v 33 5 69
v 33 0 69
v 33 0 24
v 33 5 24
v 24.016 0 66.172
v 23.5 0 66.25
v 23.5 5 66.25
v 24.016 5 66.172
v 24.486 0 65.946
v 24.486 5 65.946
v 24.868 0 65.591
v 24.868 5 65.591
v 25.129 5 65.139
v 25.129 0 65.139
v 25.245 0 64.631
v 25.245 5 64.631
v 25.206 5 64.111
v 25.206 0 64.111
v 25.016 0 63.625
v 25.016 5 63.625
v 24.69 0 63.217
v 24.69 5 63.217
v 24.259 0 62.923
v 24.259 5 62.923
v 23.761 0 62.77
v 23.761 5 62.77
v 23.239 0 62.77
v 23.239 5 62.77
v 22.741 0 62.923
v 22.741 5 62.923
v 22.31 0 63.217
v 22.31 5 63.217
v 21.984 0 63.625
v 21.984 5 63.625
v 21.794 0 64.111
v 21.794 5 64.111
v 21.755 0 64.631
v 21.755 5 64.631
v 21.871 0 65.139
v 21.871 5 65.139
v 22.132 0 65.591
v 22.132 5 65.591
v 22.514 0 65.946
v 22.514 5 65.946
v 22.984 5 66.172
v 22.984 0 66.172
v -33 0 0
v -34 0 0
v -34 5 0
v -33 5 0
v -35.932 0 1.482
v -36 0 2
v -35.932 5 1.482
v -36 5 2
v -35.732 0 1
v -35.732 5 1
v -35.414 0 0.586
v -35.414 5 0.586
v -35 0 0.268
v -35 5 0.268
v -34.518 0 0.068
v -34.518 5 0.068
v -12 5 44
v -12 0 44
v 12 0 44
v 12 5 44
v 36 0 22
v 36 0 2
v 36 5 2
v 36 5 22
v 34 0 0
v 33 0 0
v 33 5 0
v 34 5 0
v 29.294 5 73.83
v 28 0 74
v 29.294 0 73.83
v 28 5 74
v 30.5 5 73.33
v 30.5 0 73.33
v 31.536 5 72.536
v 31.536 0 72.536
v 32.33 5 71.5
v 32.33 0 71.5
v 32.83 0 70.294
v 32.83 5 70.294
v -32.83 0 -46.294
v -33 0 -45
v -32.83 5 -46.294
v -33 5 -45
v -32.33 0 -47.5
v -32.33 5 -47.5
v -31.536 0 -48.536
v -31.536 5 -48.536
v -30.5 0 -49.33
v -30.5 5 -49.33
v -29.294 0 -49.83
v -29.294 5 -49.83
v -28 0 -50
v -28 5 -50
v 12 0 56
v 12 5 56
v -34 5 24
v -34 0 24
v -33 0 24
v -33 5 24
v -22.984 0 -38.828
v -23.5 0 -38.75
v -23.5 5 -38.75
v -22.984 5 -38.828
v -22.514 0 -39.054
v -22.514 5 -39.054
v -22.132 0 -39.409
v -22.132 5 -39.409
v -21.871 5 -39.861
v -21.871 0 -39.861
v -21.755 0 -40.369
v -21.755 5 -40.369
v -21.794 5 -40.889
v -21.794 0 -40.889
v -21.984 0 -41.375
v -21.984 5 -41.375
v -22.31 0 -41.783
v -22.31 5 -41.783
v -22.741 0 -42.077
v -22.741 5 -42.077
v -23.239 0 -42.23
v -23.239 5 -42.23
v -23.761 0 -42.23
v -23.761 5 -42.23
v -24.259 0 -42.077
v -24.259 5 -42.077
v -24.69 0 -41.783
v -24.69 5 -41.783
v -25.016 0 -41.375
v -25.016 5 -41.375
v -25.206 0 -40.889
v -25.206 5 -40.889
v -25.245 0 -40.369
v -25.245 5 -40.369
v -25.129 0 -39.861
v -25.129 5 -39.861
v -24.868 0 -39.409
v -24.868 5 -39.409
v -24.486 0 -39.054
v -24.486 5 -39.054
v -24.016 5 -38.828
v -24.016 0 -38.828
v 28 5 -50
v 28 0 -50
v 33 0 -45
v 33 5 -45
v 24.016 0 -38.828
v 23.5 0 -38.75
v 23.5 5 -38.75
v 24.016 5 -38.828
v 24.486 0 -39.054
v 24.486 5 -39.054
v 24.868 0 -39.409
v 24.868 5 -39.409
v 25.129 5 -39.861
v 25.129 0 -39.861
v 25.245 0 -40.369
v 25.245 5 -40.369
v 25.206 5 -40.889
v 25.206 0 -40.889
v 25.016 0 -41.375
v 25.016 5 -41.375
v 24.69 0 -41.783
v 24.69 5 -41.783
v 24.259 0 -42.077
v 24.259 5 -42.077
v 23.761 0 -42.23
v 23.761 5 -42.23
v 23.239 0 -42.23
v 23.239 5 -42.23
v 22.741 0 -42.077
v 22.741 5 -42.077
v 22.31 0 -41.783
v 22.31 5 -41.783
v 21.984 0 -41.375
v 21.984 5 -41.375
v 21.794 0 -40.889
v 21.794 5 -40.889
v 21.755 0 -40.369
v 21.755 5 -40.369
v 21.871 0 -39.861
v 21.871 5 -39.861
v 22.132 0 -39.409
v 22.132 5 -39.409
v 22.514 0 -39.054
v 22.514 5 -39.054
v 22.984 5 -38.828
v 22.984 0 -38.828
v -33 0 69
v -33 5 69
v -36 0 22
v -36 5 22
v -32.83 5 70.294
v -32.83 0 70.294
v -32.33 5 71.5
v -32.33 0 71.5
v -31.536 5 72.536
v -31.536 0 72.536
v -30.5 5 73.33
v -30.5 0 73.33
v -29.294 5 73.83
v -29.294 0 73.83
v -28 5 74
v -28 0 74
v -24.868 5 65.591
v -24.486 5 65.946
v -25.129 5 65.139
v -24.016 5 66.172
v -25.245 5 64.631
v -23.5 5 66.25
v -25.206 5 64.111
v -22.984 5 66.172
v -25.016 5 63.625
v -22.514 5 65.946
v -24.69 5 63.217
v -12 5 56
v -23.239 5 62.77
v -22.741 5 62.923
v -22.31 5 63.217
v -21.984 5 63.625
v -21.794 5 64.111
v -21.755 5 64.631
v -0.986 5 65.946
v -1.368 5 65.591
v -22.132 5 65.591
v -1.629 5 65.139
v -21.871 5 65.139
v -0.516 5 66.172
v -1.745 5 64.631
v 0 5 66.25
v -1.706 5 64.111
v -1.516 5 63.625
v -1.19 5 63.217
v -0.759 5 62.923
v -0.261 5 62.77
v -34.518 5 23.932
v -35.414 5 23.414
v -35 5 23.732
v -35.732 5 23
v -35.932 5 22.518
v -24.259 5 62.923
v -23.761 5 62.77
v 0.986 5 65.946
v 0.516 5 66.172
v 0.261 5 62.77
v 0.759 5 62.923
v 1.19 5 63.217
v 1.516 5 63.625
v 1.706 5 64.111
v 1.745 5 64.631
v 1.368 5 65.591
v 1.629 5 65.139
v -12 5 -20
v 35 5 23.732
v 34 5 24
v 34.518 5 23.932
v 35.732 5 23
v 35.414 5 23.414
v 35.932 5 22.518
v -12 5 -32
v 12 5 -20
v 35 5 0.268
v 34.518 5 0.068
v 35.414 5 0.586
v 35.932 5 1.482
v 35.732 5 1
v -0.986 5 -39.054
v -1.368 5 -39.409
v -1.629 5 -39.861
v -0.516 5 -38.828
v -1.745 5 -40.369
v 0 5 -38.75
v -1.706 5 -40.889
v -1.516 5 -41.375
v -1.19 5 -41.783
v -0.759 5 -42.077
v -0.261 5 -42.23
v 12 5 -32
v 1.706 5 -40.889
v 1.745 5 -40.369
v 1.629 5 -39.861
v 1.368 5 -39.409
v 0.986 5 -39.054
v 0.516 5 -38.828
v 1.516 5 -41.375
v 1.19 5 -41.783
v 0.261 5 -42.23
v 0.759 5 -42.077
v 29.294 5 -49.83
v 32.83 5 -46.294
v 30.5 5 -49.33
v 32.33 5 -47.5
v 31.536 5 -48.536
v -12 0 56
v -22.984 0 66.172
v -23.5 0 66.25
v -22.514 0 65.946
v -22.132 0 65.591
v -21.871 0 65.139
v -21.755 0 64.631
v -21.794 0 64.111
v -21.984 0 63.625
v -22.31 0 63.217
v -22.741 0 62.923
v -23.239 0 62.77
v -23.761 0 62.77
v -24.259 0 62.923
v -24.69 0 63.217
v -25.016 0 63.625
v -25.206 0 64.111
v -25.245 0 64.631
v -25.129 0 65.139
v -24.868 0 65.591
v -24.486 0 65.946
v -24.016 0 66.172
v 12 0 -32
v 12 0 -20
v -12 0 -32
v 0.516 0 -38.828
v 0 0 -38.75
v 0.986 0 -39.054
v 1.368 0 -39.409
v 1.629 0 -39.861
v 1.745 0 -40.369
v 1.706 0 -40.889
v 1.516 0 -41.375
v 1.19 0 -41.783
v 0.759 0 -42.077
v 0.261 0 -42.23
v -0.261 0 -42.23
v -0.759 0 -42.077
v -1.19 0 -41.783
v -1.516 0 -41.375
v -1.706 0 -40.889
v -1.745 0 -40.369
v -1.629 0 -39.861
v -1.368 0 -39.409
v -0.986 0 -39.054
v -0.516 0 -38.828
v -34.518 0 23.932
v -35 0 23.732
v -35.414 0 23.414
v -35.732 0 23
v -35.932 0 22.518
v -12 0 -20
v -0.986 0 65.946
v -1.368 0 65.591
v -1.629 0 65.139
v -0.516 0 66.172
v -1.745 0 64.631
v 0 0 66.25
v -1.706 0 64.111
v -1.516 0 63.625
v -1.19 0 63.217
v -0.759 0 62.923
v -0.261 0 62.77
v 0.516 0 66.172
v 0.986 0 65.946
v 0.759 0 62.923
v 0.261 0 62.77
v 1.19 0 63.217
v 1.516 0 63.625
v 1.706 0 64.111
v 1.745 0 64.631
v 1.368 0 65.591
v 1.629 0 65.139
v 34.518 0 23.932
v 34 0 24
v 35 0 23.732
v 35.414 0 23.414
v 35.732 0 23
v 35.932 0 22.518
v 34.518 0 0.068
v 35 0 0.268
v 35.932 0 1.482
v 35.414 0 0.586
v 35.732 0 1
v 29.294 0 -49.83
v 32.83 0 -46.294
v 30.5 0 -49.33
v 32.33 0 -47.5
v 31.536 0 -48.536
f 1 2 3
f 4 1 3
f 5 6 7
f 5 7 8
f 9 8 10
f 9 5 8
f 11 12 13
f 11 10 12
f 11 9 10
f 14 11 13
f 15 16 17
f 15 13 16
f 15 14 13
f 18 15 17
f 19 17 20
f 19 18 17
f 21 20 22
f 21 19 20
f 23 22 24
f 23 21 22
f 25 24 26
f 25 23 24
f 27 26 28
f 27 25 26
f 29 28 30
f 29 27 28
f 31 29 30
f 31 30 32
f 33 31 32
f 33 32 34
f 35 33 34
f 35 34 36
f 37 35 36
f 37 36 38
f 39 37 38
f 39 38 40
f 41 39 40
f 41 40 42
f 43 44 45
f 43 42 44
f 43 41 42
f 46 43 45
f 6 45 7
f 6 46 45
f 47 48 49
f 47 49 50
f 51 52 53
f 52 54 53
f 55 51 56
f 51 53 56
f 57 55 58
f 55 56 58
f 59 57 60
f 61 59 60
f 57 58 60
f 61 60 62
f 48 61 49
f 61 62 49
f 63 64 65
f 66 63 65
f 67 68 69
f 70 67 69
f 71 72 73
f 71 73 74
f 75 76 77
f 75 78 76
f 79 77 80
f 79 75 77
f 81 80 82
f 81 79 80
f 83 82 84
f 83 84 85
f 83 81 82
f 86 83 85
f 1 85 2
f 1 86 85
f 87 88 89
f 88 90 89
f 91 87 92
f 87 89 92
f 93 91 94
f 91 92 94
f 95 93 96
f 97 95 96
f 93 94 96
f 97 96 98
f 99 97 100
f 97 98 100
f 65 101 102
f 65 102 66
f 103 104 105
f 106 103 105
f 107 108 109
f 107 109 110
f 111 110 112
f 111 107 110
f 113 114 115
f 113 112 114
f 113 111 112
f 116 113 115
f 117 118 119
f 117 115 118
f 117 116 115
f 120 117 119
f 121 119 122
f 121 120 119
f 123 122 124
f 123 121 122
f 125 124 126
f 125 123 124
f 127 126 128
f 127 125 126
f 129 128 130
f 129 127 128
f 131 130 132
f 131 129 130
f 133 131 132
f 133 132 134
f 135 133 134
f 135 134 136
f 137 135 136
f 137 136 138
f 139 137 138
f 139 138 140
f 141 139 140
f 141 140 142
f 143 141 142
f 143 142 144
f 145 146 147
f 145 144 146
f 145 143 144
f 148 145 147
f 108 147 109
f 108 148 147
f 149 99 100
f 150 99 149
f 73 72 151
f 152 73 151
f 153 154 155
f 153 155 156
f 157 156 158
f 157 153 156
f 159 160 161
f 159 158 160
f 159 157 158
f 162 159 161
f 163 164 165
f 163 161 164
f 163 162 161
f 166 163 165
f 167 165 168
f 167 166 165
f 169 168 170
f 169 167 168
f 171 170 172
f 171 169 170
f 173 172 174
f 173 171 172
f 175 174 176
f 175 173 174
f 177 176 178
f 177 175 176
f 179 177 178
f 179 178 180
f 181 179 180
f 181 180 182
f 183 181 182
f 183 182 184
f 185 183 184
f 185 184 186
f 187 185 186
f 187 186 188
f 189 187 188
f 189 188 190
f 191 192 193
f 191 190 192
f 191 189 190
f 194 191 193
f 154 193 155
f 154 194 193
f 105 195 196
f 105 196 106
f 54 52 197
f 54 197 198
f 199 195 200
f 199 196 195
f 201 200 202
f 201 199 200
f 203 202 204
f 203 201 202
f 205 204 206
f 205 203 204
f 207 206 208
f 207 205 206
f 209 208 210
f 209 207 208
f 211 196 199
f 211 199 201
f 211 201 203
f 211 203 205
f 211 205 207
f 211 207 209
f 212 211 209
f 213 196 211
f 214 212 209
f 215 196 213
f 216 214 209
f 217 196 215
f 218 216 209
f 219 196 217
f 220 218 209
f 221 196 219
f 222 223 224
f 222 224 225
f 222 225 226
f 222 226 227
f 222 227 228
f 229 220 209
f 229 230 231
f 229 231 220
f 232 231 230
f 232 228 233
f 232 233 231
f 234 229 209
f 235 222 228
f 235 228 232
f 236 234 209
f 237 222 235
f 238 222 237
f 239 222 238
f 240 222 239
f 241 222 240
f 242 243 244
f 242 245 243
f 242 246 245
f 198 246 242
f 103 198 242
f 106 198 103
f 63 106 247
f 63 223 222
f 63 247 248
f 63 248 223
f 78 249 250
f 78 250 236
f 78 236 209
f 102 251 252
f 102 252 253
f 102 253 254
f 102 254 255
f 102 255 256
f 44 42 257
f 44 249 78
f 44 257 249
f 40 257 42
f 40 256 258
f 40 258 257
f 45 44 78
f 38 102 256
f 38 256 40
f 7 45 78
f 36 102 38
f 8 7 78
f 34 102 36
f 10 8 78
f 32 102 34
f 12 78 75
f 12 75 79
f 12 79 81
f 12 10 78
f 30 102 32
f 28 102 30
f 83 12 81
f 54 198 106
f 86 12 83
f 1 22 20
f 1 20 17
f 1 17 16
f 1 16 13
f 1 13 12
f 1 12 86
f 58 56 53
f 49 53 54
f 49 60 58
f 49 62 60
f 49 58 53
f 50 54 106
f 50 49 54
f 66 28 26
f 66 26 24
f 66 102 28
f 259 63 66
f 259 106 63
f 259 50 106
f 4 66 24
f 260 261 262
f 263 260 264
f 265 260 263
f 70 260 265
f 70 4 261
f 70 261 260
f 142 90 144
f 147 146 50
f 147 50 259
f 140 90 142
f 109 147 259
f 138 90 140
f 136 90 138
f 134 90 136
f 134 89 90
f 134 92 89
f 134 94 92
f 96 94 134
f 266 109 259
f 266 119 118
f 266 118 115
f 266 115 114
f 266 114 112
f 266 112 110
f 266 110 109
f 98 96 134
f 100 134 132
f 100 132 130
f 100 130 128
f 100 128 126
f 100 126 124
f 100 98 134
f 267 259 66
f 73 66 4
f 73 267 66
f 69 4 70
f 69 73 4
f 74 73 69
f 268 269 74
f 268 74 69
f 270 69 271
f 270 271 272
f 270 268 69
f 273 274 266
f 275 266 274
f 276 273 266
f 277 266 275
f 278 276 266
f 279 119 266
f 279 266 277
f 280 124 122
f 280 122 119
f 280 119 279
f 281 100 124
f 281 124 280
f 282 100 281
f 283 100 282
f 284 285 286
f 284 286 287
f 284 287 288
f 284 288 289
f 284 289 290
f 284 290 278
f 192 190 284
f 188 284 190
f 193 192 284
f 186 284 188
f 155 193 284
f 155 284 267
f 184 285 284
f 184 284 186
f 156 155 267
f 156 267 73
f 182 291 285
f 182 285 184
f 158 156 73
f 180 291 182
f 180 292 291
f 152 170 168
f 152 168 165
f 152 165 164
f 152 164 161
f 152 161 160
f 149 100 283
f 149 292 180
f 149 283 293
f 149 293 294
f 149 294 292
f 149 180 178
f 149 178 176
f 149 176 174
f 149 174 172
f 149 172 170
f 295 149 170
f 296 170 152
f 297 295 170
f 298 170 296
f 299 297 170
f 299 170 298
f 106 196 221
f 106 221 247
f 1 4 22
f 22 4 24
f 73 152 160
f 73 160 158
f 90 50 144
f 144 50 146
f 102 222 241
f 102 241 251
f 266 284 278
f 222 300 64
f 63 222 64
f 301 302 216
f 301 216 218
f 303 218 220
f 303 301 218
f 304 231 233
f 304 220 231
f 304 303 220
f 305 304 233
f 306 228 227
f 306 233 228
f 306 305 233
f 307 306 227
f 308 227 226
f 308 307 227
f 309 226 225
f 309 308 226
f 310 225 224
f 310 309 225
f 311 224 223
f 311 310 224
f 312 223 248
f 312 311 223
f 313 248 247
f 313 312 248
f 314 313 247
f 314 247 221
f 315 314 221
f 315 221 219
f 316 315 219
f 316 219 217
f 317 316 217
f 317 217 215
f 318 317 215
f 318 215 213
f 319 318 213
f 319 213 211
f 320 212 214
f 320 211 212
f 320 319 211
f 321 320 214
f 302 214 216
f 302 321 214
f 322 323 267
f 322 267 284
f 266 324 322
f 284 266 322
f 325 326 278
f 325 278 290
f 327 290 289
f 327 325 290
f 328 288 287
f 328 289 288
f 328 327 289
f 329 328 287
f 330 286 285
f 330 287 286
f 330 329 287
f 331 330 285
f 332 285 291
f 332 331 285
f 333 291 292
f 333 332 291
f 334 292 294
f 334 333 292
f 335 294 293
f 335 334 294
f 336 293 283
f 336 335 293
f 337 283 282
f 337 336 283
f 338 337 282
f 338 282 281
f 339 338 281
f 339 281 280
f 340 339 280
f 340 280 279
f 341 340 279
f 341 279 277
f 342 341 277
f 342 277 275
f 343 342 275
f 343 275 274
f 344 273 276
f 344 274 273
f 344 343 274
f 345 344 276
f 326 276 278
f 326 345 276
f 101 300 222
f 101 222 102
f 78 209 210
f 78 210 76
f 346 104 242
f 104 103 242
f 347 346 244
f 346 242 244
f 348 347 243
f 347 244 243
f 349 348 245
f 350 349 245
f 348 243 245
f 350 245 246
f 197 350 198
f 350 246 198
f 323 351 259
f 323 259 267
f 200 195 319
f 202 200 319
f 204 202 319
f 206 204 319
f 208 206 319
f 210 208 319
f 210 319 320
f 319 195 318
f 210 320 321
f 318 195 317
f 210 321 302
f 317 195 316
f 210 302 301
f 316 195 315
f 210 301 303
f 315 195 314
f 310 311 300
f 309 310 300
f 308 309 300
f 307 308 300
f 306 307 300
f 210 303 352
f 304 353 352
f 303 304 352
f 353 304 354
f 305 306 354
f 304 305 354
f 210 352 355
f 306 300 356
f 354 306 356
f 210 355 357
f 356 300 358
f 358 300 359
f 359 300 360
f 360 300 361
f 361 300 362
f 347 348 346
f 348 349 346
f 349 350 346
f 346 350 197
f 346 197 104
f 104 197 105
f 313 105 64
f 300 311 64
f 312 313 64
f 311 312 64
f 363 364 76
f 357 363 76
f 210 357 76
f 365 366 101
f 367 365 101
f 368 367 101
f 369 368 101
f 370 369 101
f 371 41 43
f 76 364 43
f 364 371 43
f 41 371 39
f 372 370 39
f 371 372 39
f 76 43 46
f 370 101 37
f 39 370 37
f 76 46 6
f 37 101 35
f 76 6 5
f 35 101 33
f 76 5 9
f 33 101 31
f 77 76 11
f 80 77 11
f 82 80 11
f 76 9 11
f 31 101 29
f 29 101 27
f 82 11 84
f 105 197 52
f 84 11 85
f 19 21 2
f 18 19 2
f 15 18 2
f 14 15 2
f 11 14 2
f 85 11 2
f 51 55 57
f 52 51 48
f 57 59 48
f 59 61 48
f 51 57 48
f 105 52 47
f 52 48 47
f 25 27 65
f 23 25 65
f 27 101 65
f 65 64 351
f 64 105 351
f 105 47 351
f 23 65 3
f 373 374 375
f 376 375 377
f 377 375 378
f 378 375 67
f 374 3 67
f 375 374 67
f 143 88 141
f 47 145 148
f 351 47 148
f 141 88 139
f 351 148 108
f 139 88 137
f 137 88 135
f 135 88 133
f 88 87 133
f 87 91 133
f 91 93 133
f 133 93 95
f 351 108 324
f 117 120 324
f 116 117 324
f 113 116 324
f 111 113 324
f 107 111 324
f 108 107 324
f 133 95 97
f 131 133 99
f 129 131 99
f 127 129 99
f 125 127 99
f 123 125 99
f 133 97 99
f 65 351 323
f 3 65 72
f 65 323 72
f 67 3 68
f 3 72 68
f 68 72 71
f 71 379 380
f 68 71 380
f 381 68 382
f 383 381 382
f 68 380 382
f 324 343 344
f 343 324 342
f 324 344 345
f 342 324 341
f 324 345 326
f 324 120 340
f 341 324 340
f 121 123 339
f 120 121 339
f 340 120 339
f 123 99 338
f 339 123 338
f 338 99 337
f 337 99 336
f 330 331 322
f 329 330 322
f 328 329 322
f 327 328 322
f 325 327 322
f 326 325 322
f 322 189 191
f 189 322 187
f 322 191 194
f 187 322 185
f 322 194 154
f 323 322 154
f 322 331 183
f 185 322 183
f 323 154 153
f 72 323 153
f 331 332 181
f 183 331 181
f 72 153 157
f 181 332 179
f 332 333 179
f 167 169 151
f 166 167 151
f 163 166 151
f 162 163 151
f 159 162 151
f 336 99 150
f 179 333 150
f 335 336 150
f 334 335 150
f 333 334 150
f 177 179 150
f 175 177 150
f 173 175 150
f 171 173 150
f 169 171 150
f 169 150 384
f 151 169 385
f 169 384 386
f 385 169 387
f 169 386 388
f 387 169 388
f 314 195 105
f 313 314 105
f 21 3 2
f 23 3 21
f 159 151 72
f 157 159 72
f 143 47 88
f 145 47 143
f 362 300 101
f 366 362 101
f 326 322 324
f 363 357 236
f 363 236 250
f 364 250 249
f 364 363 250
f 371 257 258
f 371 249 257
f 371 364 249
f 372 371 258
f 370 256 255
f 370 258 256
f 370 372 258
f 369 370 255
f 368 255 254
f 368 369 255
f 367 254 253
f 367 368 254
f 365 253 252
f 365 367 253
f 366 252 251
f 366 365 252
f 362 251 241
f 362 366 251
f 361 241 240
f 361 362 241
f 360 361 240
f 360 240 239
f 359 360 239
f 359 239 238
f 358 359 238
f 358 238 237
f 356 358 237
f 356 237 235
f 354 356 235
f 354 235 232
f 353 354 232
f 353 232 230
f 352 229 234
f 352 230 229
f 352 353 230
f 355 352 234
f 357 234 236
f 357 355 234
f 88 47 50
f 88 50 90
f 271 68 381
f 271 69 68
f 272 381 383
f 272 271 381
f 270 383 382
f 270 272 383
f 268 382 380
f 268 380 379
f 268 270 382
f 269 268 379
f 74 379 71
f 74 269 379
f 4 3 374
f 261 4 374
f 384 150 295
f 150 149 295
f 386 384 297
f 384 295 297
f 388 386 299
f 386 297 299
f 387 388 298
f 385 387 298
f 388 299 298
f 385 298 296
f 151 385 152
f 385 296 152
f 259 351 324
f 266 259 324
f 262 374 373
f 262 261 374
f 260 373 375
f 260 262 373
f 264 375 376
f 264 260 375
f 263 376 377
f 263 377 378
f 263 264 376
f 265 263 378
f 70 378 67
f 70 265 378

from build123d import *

# Parameters (mm, degrees)
SKETCH_1_W               = 72
SKETCH_1_H               = 100
EXTRUDE_1_DEPTH          = 5
SKETCH_2_W               = 72
SKETCH_2_H               = 5
EXTRUDE_2_DEPTH          = 24
CUT_EXTRUDE_1_DEPTH      = 83.443920334
CUT_EXTRUDE_1_DEPTH_BACK = 83.443920334
SKETCH_3_W               = 3
SKETCH_3_H               = 50
CUT_EXTRUDE_2_DEPTH      = 83.443920334
CUT_EXTRUDE_2_DEPTH_BACK = 83.443920334
SKETCH_5_R               = 1.75
CUT_EXTRUDE_3_DEPTH      = 83.443920334
CUT_EXTRUDE_3_DEPTH_BACK = 83.443920334
SKETCH_6_R               = 1.75
CUT_EXTRUDE_4_DEPTH      = 83.443920334
CUT_EXTRUDE_4_DEPTH_BACK = 83.443920334
SKETCH_7_W               = 24
SKETCH_7_H               = 12
FILLET_1_R               = 5
FILLET_2_R               = 2
CUT_EXTRUDE_5_DEPTH      = 83.443920334
CUT_EXTRUDE_5_DEPTH_BACK = 83.443920334
SKETCH_8_R               = 1.75


with BuildPart() as part:
    # 草图1 → 凸台-拉伸1 (new body)
    with BuildSketch(Plane(origin=(0, 0, 0), x_dir=(1, 0, 0), z_dir=(0, 1, 0))):
        Rectangle(SKETCH_1_W, SKETCH_1_H)
    extrude(amount=EXTRUDE_1_DEPTH)

    # 草图2 → 凸台-拉伸2 (add)
    with BuildSketch(Plane.XY.offset(50)):
        with Locations((0, 2.5)):
            Rectangle(SKETCH_2_W, SKETCH_2_H)
    extrude(amount=EXTRUDE_2_DEPTH)

    # 草图3 → 切除-拉伸1 (cut, two sides: drawn at the far end of the back side and taken through both)
    with BuildSketch(Plane(origin=(0, 5, 0), x_dir=(1, 0, 0), z_dir=(0, 1, 0)).offset(-CUT_EXTRUDE_1_DEPTH_BACK)):
        with Locations((-34.5, 25)):
            Rectangle(SKETCH_3_W, SKETCH_3_H)
        with Locations((34.5, 25)):
            Rectangle(SKETCH_3_W, SKETCH_3_H)
        with Locations((-34.5, -49)):
            Rectangle(SKETCH_3_W, SKETCH_3_H)
        with Locations((34.5, -49)):
            Rectangle(SKETCH_3_W, SKETCH_3_H)
    extrude(amount=CUT_EXTRUDE_1_DEPTH + CUT_EXTRUDE_1_DEPTH_BACK, mode=Mode.SUBTRACT)

    # 草图5 → 切除-拉伸2 (cut, two sides: drawn at the far end of the back side and taken through both)
    with BuildSketch(Plane(origin=(0, 5, 0), x_dir=(1, 0, 0), z_dir=(0, 1, 0)).offset(-CUT_EXTRUDE_2_DEPTH_BACK)):
        with Locations(Location((-23.5, 40.5, 0), (0, 0, 270))):
            Circle(SKETCH_5_R)
    extrude(amount=CUT_EXTRUDE_2_DEPTH + CUT_EXTRUDE_2_DEPTH_BACK, mode=Mode.SUBTRACT)

    # 草图6 → 切除-拉伸3 (cut, two sides: drawn at the far end of the back side and taken through both)
    with BuildSketch(Plane(origin=(0, 5, 0), x_dir=(1, 0, 0), z_dir=(0, 1, 0)).offset(-CUT_EXTRUDE_3_DEPTH_BACK)):
        with Locations(Location((23.5, 40.5, 0), (0, 0, 270))):
            Circle(SKETCH_6_R)
        with Locations(Location((-23.5, -64.5, 0), (0, 0, 270))):
            Circle(SKETCH_6_R)
        with Locations(Location((23.5, -64.5, 0), (0, 0, 270))):
            Circle(SKETCH_6_R)
    extrude(amount=CUT_EXTRUDE_3_DEPTH + CUT_EXTRUDE_3_DEPTH_BACK, mode=Mode.SUBTRACT)

    # 草图7 → 切除-拉伸4 (cut, two sides: drawn at the far end of the back side and taken through both)
    with BuildSketch(Plane(origin=(0, 5, 0), x_dir=(1, 0, 0), z_dir=(0, 1, 0)).offset(-CUT_EXTRUDE_4_DEPTH_BACK)):
        with Locations((0, -50)):
            Rectangle(SKETCH_7_W, SKETCH_7_H)
        with Locations((0, 26)):
            Rectangle(SKETCH_7_W, SKETCH_7_H)
    extrude(amount=CUT_EXTRUDE_4_DEPTH + CUT_EXTRUDE_4_DEPTH_BACK, mode=Mode.SUBTRACT)

    # 圆角1
    fillet_1_edges = [part.edges().sort_by_distance(p)[0] for p in [
        (33, 2.5, -50),
        (-33, 2.5, 74),
        (33, 2.5, 74),
        (-33, 2.5, -50),
    ]]
    fillet(fillet_1_edges, radius=FILLET_1_R)

    # 圆角2
    fillet_2_edges = [part.edges().sort_by_distance(p)[0] for p in [
        (36, 2.5, 0),
        (-36, 2.5, 24),
        (36, 2.5, 24),
        (-36, 2.5, 0),
    ]]
    fillet(fillet_2_edges, radius=FILLET_2_R)

    # 草图8 → 切除-拉伸5 (cut, two sides: drawn at the far end of the back side and taken through both)
    with BuildSketch(Plane(origin=(0, 5, 0), x_dir=(1, 0, 0), z_dir=(0, 1, 0)).offset(-CUT_EXTRUDE_5_DEPTH_BACK)):
        with Locations(Location((0, 40.5, 0), (0, 0, 270))):
            Circle(SKETCH_8_R)
        with Locations(Location((0, -64.5, 0), (0, 0, 270))):
            Circle(SKETCH_8_R)
    extrude(amount=CUT_EXTRUDE_5_DEPTH + CUT_EXTRUDE_5_DEPTH_BACK, mode=Mode.SUBTRACT)


solid = part.part
